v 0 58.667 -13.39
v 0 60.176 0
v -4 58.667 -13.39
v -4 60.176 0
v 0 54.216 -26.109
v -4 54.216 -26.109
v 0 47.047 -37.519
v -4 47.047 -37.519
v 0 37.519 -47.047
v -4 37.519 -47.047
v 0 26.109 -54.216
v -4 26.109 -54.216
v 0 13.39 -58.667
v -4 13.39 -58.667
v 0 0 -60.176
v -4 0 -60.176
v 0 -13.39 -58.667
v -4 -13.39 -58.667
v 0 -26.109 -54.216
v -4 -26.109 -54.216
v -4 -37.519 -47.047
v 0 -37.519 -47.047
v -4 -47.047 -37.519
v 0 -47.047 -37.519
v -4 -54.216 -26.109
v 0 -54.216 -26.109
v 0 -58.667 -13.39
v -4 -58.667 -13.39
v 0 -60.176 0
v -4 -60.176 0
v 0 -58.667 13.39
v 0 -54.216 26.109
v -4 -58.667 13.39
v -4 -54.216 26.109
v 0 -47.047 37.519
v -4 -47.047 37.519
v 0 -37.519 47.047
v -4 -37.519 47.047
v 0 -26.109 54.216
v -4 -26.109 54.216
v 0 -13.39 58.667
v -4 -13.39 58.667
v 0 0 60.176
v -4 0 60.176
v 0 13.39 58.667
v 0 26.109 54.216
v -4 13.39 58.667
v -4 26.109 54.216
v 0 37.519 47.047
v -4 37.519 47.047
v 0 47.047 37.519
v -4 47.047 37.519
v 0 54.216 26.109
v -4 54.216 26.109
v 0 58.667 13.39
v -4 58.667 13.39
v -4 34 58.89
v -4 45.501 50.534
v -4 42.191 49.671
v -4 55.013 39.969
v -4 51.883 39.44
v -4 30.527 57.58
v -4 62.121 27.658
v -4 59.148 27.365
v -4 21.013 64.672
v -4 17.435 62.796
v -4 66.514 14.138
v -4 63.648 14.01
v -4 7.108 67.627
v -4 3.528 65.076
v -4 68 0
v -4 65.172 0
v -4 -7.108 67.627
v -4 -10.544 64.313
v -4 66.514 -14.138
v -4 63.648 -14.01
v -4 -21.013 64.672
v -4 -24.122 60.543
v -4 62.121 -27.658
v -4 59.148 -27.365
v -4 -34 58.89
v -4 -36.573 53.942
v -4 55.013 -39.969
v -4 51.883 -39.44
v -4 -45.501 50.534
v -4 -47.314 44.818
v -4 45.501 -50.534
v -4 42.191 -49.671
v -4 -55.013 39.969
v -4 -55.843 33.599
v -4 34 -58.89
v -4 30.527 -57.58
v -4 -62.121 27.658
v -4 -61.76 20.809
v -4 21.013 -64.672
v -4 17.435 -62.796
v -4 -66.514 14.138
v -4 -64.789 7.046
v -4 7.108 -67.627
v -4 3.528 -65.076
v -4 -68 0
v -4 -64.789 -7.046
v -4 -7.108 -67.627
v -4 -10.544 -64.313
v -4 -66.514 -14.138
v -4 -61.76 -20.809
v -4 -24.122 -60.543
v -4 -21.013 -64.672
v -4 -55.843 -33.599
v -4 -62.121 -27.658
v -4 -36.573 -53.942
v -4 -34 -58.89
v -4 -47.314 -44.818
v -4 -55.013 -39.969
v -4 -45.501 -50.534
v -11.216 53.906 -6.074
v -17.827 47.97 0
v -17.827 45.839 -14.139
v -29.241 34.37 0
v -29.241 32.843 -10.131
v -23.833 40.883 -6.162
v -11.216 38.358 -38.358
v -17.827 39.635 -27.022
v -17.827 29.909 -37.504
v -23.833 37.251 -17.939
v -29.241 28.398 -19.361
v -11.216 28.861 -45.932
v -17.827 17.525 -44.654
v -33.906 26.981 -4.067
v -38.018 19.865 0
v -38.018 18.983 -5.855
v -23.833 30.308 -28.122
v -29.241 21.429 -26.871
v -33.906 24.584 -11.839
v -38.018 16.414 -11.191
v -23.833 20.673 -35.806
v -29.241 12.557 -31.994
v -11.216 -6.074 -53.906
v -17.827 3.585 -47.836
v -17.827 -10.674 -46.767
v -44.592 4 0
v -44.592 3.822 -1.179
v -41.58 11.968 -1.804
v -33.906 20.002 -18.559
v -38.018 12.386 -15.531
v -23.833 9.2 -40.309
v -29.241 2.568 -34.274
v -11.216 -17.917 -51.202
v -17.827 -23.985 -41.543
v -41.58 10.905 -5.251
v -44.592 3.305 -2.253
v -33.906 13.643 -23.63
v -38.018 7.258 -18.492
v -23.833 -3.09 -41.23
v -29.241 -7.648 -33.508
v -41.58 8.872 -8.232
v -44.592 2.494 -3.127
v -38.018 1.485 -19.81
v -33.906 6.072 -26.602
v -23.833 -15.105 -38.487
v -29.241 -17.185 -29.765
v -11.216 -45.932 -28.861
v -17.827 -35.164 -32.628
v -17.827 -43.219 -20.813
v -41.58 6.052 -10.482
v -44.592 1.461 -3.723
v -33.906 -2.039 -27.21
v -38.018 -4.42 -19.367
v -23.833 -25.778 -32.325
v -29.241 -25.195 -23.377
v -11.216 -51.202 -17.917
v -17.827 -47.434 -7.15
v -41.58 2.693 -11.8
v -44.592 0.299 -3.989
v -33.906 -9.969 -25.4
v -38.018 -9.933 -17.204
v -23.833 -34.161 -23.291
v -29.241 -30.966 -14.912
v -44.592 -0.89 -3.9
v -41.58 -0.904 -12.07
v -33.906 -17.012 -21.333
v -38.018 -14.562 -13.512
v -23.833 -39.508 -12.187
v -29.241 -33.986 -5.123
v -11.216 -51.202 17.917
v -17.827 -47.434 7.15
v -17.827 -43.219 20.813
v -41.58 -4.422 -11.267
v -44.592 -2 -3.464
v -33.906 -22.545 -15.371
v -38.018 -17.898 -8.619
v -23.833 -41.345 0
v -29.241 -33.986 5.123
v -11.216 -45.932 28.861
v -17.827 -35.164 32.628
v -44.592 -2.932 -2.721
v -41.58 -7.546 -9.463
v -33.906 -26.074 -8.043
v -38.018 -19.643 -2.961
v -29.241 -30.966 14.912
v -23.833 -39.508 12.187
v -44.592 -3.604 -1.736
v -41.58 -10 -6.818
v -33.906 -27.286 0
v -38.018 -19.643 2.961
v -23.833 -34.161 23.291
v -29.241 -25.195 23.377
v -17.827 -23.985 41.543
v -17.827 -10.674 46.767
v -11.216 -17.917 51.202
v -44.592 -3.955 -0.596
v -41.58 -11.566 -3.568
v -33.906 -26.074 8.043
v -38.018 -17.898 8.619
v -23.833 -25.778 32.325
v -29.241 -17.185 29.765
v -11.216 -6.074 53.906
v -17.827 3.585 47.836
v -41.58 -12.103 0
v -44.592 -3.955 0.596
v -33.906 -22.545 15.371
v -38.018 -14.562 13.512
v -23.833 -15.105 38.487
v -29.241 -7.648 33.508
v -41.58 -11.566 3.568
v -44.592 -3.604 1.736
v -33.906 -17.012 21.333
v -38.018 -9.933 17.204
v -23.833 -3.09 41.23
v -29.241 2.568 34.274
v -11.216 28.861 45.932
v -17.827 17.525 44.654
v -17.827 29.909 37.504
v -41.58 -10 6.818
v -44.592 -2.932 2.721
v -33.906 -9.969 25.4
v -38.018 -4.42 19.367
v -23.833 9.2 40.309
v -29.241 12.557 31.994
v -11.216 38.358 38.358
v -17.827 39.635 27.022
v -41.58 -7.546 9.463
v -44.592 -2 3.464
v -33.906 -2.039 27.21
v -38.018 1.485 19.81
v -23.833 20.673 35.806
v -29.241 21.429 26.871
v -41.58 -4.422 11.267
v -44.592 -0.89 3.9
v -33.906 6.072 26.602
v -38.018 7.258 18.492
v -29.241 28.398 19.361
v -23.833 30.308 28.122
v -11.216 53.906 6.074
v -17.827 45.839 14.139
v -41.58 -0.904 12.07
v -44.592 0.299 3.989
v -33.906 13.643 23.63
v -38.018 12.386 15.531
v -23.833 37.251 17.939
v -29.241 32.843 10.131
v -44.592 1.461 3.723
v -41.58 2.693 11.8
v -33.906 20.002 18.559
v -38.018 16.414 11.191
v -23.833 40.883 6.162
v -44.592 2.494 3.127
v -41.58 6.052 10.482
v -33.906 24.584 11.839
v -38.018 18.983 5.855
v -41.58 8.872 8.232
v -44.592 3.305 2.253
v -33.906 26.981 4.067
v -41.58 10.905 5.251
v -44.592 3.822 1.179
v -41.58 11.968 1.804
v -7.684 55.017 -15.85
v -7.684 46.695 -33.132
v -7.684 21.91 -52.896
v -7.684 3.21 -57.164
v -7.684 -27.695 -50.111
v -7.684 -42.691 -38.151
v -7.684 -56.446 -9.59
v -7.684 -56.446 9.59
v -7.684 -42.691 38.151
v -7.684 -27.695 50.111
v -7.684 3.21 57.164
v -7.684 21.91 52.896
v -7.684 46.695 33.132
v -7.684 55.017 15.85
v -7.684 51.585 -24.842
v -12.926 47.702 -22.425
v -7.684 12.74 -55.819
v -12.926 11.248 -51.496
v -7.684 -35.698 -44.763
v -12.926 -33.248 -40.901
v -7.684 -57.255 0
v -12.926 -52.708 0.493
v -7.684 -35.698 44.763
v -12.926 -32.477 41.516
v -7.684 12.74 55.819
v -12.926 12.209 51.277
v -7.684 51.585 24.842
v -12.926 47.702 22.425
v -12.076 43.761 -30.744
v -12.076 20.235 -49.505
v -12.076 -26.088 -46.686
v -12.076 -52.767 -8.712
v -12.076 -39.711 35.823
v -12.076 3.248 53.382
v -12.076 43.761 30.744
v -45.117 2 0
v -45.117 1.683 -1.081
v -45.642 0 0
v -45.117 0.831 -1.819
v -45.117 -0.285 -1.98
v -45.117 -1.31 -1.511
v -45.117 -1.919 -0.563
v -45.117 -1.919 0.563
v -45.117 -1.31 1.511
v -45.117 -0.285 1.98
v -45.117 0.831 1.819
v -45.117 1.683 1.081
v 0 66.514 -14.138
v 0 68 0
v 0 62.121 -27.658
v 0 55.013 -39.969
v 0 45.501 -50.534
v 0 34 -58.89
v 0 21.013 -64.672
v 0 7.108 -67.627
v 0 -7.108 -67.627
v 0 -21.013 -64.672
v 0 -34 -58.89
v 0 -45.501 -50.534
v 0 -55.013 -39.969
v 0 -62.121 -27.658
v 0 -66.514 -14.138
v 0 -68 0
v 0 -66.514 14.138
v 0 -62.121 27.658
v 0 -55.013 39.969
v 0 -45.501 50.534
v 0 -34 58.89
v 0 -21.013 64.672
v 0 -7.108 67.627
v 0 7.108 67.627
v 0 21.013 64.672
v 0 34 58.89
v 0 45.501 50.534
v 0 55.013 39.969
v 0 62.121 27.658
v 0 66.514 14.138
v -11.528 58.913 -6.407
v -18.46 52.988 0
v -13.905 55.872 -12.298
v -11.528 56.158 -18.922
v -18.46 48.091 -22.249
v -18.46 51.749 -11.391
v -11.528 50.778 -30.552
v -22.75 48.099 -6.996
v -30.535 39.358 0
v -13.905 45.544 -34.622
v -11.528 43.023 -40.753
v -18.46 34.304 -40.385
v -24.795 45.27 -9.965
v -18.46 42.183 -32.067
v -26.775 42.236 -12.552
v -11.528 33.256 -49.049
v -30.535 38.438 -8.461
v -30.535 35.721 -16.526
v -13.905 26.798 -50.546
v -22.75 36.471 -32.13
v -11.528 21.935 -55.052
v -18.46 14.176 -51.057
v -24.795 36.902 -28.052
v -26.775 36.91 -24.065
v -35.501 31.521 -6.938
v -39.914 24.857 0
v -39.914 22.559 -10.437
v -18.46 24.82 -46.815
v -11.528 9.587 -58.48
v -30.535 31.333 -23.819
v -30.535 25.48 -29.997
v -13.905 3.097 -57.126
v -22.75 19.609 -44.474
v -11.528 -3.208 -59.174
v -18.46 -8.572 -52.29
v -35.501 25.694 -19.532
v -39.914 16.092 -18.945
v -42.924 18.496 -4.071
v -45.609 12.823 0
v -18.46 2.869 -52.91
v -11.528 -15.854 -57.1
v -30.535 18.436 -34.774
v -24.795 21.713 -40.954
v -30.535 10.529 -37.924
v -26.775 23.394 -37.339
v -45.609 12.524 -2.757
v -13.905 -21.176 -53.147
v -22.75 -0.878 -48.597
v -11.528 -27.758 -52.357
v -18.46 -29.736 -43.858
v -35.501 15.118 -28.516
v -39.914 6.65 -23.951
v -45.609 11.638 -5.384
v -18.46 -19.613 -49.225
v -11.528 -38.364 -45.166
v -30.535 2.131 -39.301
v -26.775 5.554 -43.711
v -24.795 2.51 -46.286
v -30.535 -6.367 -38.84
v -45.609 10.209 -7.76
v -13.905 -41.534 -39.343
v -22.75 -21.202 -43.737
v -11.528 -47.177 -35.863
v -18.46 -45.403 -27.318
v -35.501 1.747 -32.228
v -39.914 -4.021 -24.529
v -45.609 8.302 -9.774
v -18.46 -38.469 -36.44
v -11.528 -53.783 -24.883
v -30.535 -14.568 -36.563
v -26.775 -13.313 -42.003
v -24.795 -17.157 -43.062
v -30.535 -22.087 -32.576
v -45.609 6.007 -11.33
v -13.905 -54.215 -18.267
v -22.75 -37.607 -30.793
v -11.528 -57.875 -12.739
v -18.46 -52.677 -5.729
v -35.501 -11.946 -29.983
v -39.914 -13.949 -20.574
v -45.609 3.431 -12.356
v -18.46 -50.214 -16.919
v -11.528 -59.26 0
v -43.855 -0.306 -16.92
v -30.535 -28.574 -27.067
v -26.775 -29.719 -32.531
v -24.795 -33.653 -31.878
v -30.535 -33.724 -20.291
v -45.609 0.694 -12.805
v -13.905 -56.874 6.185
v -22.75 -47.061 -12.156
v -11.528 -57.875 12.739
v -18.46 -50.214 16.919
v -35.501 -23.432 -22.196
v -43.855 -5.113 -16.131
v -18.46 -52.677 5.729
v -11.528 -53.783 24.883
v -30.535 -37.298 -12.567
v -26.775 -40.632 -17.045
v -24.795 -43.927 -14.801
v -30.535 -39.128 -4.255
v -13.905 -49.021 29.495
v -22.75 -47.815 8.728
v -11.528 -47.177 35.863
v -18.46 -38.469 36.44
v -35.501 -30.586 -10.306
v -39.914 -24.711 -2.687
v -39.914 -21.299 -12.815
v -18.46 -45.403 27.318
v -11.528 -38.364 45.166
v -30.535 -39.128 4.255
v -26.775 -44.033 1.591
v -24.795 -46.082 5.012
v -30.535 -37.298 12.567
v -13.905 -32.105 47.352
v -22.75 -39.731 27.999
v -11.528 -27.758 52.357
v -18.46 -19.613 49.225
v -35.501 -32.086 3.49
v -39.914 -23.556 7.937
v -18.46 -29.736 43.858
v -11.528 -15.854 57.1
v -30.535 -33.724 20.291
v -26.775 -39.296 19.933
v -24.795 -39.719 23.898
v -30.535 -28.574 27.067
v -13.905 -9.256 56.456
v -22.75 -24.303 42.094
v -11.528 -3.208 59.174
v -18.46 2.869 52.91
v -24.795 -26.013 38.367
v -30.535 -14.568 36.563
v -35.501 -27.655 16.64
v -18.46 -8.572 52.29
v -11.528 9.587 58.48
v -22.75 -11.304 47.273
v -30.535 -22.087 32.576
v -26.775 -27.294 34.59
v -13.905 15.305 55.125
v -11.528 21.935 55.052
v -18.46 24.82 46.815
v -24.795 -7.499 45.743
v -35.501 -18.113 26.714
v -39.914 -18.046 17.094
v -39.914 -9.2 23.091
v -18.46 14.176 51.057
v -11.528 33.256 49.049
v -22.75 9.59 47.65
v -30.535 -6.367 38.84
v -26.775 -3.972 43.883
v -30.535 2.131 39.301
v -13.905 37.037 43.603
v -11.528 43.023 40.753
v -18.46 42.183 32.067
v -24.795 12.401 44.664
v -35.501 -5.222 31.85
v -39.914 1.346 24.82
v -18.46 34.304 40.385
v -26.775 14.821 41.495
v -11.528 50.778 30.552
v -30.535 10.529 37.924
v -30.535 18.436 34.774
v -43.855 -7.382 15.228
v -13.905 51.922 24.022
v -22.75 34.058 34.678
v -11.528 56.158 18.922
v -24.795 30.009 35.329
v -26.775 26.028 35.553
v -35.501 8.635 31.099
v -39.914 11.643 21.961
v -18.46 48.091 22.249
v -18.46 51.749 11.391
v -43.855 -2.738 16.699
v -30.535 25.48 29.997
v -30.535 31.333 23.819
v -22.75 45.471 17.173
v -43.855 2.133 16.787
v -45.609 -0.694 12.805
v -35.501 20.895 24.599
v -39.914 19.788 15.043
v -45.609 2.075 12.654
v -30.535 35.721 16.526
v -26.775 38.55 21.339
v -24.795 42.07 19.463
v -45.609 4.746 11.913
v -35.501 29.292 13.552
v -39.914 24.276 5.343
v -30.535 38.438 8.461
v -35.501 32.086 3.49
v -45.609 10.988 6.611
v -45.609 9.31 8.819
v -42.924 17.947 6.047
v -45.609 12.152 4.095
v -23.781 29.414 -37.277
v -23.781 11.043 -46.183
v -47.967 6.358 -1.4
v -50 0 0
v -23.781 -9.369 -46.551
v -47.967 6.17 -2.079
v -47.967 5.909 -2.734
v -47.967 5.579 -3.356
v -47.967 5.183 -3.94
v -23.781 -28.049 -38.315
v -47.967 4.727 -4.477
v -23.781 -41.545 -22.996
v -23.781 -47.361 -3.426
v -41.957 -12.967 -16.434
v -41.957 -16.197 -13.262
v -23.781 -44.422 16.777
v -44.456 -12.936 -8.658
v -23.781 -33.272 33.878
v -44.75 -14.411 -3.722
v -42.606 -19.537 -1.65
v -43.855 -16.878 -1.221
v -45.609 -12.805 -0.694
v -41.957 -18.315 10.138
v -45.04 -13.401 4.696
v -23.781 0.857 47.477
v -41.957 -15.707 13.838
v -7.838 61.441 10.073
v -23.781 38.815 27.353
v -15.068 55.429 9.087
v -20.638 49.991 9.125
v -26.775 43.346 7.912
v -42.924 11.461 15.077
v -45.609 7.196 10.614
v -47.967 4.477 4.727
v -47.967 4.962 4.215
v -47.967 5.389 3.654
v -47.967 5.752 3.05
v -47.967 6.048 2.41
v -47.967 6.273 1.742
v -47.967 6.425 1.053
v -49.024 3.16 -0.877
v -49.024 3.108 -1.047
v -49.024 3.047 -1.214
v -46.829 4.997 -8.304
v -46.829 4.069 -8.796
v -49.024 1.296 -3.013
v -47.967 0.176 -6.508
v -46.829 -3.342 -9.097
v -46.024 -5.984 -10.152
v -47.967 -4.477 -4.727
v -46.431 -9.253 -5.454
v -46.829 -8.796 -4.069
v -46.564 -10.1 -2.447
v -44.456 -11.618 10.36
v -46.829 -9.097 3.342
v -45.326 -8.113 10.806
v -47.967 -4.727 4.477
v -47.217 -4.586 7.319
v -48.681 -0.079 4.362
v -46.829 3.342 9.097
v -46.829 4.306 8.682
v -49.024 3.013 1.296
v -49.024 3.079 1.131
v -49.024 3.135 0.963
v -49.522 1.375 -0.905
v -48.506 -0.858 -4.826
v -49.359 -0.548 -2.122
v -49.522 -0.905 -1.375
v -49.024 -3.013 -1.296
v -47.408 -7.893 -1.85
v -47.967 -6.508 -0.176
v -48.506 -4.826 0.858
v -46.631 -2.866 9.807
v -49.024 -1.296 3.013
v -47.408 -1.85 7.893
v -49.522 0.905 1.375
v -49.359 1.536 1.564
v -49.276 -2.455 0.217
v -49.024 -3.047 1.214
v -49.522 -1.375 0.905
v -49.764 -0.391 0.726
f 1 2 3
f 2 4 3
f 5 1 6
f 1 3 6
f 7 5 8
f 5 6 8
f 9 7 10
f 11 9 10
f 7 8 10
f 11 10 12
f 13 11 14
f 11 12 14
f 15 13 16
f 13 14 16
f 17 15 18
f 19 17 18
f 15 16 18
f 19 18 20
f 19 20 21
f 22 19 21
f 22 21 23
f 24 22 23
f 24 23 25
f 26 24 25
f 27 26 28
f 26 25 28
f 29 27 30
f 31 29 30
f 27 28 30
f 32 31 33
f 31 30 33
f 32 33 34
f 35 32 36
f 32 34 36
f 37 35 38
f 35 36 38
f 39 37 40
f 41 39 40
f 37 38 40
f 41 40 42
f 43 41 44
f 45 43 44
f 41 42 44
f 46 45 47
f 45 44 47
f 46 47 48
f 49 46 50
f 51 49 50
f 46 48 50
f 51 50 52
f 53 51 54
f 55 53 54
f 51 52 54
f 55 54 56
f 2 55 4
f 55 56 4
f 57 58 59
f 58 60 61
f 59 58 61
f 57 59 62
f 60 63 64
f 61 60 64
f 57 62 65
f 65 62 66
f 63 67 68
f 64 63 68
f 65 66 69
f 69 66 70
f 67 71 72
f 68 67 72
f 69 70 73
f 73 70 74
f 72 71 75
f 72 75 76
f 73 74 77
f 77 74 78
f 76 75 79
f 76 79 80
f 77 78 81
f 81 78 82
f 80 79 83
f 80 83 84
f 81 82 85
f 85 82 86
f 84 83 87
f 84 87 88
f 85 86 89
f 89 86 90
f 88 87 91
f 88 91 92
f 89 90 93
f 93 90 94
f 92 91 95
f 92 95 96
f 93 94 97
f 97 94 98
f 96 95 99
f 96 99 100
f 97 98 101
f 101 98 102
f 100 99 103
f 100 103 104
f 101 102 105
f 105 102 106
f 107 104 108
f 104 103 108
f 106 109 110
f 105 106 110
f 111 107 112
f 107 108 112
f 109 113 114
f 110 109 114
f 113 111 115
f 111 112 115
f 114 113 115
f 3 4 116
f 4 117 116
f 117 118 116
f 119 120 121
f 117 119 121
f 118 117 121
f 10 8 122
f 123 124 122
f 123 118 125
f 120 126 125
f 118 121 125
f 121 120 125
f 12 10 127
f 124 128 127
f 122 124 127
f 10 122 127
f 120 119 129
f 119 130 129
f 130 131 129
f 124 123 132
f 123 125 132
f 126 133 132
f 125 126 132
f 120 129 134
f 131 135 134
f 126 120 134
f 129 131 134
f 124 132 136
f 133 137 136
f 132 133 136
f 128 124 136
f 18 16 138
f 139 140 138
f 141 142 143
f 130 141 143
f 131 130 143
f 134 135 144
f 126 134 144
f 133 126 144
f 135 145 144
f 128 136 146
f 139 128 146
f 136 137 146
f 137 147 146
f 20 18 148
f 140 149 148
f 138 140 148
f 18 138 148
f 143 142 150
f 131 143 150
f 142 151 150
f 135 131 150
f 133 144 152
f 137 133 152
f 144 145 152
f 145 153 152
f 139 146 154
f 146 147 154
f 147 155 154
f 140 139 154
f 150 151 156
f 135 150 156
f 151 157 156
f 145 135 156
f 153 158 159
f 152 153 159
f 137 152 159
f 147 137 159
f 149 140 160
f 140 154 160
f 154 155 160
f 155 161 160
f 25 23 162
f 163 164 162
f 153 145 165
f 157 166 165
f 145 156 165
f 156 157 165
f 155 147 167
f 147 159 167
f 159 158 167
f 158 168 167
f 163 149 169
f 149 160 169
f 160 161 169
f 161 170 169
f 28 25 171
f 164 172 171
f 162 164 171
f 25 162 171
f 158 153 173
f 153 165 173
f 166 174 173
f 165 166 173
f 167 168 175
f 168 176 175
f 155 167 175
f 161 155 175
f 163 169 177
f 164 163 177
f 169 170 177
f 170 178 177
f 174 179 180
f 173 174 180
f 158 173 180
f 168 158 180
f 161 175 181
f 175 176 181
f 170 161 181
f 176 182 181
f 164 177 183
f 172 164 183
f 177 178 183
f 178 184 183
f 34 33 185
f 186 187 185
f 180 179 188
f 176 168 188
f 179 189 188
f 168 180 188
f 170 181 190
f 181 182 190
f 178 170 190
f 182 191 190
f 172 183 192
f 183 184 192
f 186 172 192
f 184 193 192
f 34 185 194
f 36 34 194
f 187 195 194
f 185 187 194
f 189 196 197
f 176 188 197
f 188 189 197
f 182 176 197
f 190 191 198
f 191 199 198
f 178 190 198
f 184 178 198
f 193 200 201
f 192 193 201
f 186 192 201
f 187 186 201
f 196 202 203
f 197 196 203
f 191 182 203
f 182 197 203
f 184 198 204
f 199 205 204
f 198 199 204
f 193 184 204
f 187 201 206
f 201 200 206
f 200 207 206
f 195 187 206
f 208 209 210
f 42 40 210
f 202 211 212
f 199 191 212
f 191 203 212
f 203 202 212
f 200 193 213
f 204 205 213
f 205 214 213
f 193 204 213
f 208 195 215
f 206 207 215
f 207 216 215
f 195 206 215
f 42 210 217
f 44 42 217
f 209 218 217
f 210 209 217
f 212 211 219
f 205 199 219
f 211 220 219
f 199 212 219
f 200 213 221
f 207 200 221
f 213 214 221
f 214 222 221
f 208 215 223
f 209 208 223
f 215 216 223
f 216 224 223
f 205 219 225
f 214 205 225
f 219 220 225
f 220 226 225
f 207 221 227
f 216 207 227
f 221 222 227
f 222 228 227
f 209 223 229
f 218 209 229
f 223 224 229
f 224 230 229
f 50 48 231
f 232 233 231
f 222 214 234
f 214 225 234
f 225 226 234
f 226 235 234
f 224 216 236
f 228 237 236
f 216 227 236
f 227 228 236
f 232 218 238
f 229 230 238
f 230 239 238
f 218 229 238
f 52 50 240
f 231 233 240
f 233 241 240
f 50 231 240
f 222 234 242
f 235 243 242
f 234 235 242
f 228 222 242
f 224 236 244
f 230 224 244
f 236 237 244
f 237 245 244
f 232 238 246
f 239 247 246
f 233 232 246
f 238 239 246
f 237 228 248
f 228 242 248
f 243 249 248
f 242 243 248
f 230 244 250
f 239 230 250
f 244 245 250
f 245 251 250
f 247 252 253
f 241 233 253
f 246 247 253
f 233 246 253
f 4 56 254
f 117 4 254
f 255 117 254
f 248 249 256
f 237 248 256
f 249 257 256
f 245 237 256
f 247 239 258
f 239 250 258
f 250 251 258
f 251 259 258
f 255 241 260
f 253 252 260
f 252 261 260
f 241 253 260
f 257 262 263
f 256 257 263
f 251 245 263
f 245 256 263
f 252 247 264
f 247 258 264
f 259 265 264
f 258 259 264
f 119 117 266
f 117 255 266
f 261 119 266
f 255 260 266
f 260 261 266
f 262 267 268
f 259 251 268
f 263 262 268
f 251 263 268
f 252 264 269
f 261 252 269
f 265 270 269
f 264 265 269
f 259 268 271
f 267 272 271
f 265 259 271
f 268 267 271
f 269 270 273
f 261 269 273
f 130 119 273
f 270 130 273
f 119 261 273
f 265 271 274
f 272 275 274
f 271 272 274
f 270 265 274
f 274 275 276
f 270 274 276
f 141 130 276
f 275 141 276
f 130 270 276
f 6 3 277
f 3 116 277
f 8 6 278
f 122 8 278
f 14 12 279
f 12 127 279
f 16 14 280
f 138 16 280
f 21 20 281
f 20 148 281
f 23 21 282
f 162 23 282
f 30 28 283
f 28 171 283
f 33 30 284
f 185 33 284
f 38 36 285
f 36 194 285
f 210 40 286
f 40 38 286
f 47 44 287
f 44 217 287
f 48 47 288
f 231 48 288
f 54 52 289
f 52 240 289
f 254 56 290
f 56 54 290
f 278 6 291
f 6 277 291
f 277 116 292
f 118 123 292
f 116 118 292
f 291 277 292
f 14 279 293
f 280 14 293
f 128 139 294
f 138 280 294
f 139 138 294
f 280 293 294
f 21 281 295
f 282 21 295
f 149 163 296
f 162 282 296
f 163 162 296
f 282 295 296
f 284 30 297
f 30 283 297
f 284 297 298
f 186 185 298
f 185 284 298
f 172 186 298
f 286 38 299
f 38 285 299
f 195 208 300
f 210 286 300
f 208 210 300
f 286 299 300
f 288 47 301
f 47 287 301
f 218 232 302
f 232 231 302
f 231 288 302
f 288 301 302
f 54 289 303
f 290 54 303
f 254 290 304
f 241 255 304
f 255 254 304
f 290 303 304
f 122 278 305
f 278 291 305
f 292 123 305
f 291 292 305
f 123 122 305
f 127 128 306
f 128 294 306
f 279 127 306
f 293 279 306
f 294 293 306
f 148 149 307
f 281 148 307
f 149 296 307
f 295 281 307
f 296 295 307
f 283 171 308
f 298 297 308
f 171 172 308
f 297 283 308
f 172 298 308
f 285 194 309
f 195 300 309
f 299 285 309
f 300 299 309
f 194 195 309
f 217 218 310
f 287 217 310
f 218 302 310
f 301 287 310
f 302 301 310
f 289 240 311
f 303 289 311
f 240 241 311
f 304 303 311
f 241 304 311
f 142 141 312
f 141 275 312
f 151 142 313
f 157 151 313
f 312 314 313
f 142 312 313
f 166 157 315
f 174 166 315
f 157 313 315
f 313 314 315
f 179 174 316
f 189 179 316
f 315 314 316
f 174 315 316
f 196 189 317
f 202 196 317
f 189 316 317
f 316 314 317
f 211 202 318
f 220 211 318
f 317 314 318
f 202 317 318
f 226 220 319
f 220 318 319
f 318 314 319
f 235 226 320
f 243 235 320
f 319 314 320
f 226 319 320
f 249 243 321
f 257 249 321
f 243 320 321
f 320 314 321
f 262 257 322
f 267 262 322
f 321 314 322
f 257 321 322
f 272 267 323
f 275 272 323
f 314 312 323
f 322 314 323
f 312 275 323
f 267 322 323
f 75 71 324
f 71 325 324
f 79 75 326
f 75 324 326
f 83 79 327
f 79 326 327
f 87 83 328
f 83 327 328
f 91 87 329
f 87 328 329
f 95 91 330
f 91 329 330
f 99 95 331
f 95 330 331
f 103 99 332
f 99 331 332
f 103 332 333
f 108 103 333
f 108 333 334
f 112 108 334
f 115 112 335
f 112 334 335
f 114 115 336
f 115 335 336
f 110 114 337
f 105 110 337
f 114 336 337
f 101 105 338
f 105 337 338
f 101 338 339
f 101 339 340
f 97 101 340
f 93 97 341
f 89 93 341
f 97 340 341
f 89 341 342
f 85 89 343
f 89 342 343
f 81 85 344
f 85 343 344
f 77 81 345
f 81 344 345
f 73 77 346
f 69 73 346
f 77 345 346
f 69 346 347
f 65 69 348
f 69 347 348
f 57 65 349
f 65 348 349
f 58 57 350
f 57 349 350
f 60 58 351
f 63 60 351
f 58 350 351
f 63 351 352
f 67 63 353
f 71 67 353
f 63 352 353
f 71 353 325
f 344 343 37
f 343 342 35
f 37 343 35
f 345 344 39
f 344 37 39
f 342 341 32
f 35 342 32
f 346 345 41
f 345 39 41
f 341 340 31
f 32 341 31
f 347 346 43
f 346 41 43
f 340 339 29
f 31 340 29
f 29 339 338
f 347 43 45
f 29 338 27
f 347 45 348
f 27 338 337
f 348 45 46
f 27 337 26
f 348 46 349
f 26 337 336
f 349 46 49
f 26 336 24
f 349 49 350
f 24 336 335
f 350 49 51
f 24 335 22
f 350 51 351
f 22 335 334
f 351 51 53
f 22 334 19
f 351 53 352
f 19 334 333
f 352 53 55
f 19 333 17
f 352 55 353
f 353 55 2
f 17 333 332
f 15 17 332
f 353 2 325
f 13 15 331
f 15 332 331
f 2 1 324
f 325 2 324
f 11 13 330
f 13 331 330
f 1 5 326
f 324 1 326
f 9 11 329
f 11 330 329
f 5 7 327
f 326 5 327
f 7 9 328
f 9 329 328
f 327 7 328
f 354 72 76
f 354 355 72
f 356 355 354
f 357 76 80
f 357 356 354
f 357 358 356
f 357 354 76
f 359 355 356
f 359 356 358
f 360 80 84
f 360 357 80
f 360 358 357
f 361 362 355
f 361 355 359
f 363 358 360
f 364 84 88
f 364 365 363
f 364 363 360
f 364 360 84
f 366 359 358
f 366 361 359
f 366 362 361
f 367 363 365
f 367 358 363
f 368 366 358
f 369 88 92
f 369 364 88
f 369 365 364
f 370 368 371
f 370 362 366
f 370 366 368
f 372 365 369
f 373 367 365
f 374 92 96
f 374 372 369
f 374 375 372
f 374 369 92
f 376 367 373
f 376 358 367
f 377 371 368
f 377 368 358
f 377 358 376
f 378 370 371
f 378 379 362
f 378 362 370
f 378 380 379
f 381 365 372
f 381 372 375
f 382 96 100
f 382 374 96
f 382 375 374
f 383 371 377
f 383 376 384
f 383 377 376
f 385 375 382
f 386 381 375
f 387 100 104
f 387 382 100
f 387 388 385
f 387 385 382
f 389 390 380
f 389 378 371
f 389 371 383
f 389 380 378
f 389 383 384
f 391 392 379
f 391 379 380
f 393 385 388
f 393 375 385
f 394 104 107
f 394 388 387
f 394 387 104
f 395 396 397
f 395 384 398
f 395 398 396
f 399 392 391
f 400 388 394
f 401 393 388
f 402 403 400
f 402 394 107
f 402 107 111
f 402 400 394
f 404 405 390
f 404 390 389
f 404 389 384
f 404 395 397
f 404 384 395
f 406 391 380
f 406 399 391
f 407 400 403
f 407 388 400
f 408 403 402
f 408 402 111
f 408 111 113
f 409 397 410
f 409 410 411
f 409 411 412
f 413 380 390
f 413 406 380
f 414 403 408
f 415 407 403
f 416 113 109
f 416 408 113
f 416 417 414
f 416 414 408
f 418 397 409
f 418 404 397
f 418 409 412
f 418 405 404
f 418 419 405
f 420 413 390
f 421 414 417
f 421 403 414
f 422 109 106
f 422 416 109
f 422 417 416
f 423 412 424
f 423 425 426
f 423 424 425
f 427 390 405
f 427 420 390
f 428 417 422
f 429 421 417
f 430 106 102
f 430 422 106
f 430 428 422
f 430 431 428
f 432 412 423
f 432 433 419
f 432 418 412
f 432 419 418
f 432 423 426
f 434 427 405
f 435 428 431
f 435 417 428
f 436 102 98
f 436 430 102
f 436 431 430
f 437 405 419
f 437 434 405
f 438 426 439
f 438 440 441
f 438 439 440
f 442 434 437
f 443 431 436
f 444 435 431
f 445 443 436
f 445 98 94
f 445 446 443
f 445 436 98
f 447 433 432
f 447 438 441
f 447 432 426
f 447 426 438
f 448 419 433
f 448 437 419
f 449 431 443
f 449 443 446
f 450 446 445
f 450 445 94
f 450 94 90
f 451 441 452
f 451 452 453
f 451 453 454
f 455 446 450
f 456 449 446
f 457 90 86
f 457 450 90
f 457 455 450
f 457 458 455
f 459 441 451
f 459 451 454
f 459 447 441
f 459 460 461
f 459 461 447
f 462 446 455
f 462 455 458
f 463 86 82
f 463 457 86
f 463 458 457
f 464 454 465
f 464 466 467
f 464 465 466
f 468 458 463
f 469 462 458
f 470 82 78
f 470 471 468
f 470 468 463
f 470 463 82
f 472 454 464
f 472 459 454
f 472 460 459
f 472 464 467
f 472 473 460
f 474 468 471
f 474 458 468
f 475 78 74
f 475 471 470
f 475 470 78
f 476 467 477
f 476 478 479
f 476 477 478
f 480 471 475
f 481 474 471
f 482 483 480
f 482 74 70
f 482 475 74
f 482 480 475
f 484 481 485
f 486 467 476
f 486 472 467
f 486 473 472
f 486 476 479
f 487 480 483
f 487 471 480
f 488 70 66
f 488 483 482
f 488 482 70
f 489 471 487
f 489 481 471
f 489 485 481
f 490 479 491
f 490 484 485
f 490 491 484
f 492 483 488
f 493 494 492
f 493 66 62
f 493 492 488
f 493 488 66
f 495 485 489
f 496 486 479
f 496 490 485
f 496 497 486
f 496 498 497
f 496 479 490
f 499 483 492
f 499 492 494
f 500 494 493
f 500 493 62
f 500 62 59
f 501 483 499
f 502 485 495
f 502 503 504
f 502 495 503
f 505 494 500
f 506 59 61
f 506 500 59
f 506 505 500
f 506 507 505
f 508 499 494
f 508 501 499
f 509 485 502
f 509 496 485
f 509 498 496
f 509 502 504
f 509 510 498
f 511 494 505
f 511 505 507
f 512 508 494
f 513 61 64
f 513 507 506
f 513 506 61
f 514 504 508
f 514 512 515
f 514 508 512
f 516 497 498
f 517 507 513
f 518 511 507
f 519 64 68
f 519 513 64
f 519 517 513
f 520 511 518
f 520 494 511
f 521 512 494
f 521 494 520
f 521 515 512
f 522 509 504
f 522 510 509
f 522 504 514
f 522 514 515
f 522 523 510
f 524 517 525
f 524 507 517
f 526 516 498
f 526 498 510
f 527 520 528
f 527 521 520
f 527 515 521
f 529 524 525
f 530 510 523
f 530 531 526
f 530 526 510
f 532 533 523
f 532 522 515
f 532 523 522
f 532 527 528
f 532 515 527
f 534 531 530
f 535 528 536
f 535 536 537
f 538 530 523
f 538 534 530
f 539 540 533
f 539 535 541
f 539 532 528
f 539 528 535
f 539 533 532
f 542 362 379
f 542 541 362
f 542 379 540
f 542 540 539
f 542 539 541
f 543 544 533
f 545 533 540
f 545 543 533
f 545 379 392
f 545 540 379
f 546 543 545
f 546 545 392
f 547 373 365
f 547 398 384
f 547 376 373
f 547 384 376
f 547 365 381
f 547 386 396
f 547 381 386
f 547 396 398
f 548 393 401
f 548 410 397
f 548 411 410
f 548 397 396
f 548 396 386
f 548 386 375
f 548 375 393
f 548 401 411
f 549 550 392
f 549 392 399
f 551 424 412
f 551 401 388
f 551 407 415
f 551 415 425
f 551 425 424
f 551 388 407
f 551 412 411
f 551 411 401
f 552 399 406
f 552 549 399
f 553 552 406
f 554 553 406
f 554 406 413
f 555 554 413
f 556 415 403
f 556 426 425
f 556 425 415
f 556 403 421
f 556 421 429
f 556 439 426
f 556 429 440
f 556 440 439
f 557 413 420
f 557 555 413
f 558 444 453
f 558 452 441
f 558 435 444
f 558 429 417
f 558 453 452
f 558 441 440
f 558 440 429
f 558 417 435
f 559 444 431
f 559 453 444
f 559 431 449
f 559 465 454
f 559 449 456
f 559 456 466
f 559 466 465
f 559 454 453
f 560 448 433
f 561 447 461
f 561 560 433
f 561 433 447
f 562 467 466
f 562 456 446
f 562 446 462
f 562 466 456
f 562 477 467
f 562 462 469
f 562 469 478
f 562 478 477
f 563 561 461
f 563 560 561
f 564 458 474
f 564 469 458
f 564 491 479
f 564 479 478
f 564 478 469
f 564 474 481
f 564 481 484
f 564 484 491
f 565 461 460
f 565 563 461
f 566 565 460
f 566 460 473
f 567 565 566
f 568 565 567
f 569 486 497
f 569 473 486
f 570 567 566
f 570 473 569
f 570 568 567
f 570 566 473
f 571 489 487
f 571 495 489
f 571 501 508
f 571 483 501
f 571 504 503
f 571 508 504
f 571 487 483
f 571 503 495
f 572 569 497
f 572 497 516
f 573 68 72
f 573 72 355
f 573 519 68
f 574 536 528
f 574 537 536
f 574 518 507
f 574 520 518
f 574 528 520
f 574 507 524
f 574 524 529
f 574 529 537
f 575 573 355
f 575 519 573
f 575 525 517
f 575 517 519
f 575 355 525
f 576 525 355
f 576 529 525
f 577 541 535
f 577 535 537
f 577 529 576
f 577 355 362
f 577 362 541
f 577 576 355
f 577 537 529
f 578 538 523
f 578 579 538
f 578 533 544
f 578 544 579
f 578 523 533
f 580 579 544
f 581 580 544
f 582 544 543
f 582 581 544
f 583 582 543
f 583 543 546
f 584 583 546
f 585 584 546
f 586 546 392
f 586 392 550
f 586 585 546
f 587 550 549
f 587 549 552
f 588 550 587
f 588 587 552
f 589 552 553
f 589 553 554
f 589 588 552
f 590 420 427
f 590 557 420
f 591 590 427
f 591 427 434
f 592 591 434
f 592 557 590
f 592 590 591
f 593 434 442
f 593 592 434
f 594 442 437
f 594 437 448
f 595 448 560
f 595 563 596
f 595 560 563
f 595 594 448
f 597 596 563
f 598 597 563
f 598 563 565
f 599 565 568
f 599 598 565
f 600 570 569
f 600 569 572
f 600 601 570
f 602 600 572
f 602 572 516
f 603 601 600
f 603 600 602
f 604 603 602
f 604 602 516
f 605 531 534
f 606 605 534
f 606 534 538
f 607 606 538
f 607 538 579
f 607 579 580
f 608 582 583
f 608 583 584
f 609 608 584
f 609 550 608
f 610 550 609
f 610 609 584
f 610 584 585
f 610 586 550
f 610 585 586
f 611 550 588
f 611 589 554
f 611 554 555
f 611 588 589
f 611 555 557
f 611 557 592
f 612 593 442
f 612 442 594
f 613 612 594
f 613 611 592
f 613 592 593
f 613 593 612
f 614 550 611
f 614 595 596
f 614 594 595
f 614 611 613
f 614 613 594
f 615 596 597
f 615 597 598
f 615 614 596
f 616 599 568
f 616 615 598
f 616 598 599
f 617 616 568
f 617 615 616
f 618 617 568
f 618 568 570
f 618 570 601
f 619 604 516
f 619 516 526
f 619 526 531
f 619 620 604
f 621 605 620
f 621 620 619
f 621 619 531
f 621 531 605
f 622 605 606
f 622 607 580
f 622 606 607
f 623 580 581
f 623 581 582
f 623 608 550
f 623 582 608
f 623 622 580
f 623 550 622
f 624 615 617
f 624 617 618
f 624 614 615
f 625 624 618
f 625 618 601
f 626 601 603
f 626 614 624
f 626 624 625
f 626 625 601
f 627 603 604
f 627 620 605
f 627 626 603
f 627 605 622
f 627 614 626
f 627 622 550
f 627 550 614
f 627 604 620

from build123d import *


with BuildPart() as part:
    # Esquisse1 → Révolution4 (revolve)
    with BuildSketch(Plane.XY):
        with BuildLine():
            Line((-45.641969606, 0), (-50, 0))
            add(Edge.make_bspline(
                [(-3.999999997, 65.171523585), (-38.761790775, 39.718563846), (-50, 0)],
                knots=[0.053439051, 0.053439051, 0.053439051, 1, 1, 1], degree=2))
            Line((-3.999999997, 65.171523585), (-3.999999997, 68))
            Line((-3.999999997, 68), (3e-09, 68))
            Line((3e-09, 68), (3e-09, 60.17556509))
            Line((3e-09, 60.17556509), (-3.999999997, 60.17556509))
            add(Edge.make_bspline(
                [(-3.999999997, 60.17556509), (-15.093792802, 51.683800687), (-29.193456354, 35.006616283), (-40.418134085, 16.6205085), (-44.591534168, 4)],
                knots=[0.086931033, 0.086931033, 0.086931033, 0.405562538, 0.617983541, 0.936615045, 0.936615045, 0.936615045], degree=2))
            Line((-44.591534168, 4), (-45.641969606, 0))
        make_face()
    revolve(axis=Axis((-45.641969606, 0, 0), (-1, 0, 0)))


solid = part.part
